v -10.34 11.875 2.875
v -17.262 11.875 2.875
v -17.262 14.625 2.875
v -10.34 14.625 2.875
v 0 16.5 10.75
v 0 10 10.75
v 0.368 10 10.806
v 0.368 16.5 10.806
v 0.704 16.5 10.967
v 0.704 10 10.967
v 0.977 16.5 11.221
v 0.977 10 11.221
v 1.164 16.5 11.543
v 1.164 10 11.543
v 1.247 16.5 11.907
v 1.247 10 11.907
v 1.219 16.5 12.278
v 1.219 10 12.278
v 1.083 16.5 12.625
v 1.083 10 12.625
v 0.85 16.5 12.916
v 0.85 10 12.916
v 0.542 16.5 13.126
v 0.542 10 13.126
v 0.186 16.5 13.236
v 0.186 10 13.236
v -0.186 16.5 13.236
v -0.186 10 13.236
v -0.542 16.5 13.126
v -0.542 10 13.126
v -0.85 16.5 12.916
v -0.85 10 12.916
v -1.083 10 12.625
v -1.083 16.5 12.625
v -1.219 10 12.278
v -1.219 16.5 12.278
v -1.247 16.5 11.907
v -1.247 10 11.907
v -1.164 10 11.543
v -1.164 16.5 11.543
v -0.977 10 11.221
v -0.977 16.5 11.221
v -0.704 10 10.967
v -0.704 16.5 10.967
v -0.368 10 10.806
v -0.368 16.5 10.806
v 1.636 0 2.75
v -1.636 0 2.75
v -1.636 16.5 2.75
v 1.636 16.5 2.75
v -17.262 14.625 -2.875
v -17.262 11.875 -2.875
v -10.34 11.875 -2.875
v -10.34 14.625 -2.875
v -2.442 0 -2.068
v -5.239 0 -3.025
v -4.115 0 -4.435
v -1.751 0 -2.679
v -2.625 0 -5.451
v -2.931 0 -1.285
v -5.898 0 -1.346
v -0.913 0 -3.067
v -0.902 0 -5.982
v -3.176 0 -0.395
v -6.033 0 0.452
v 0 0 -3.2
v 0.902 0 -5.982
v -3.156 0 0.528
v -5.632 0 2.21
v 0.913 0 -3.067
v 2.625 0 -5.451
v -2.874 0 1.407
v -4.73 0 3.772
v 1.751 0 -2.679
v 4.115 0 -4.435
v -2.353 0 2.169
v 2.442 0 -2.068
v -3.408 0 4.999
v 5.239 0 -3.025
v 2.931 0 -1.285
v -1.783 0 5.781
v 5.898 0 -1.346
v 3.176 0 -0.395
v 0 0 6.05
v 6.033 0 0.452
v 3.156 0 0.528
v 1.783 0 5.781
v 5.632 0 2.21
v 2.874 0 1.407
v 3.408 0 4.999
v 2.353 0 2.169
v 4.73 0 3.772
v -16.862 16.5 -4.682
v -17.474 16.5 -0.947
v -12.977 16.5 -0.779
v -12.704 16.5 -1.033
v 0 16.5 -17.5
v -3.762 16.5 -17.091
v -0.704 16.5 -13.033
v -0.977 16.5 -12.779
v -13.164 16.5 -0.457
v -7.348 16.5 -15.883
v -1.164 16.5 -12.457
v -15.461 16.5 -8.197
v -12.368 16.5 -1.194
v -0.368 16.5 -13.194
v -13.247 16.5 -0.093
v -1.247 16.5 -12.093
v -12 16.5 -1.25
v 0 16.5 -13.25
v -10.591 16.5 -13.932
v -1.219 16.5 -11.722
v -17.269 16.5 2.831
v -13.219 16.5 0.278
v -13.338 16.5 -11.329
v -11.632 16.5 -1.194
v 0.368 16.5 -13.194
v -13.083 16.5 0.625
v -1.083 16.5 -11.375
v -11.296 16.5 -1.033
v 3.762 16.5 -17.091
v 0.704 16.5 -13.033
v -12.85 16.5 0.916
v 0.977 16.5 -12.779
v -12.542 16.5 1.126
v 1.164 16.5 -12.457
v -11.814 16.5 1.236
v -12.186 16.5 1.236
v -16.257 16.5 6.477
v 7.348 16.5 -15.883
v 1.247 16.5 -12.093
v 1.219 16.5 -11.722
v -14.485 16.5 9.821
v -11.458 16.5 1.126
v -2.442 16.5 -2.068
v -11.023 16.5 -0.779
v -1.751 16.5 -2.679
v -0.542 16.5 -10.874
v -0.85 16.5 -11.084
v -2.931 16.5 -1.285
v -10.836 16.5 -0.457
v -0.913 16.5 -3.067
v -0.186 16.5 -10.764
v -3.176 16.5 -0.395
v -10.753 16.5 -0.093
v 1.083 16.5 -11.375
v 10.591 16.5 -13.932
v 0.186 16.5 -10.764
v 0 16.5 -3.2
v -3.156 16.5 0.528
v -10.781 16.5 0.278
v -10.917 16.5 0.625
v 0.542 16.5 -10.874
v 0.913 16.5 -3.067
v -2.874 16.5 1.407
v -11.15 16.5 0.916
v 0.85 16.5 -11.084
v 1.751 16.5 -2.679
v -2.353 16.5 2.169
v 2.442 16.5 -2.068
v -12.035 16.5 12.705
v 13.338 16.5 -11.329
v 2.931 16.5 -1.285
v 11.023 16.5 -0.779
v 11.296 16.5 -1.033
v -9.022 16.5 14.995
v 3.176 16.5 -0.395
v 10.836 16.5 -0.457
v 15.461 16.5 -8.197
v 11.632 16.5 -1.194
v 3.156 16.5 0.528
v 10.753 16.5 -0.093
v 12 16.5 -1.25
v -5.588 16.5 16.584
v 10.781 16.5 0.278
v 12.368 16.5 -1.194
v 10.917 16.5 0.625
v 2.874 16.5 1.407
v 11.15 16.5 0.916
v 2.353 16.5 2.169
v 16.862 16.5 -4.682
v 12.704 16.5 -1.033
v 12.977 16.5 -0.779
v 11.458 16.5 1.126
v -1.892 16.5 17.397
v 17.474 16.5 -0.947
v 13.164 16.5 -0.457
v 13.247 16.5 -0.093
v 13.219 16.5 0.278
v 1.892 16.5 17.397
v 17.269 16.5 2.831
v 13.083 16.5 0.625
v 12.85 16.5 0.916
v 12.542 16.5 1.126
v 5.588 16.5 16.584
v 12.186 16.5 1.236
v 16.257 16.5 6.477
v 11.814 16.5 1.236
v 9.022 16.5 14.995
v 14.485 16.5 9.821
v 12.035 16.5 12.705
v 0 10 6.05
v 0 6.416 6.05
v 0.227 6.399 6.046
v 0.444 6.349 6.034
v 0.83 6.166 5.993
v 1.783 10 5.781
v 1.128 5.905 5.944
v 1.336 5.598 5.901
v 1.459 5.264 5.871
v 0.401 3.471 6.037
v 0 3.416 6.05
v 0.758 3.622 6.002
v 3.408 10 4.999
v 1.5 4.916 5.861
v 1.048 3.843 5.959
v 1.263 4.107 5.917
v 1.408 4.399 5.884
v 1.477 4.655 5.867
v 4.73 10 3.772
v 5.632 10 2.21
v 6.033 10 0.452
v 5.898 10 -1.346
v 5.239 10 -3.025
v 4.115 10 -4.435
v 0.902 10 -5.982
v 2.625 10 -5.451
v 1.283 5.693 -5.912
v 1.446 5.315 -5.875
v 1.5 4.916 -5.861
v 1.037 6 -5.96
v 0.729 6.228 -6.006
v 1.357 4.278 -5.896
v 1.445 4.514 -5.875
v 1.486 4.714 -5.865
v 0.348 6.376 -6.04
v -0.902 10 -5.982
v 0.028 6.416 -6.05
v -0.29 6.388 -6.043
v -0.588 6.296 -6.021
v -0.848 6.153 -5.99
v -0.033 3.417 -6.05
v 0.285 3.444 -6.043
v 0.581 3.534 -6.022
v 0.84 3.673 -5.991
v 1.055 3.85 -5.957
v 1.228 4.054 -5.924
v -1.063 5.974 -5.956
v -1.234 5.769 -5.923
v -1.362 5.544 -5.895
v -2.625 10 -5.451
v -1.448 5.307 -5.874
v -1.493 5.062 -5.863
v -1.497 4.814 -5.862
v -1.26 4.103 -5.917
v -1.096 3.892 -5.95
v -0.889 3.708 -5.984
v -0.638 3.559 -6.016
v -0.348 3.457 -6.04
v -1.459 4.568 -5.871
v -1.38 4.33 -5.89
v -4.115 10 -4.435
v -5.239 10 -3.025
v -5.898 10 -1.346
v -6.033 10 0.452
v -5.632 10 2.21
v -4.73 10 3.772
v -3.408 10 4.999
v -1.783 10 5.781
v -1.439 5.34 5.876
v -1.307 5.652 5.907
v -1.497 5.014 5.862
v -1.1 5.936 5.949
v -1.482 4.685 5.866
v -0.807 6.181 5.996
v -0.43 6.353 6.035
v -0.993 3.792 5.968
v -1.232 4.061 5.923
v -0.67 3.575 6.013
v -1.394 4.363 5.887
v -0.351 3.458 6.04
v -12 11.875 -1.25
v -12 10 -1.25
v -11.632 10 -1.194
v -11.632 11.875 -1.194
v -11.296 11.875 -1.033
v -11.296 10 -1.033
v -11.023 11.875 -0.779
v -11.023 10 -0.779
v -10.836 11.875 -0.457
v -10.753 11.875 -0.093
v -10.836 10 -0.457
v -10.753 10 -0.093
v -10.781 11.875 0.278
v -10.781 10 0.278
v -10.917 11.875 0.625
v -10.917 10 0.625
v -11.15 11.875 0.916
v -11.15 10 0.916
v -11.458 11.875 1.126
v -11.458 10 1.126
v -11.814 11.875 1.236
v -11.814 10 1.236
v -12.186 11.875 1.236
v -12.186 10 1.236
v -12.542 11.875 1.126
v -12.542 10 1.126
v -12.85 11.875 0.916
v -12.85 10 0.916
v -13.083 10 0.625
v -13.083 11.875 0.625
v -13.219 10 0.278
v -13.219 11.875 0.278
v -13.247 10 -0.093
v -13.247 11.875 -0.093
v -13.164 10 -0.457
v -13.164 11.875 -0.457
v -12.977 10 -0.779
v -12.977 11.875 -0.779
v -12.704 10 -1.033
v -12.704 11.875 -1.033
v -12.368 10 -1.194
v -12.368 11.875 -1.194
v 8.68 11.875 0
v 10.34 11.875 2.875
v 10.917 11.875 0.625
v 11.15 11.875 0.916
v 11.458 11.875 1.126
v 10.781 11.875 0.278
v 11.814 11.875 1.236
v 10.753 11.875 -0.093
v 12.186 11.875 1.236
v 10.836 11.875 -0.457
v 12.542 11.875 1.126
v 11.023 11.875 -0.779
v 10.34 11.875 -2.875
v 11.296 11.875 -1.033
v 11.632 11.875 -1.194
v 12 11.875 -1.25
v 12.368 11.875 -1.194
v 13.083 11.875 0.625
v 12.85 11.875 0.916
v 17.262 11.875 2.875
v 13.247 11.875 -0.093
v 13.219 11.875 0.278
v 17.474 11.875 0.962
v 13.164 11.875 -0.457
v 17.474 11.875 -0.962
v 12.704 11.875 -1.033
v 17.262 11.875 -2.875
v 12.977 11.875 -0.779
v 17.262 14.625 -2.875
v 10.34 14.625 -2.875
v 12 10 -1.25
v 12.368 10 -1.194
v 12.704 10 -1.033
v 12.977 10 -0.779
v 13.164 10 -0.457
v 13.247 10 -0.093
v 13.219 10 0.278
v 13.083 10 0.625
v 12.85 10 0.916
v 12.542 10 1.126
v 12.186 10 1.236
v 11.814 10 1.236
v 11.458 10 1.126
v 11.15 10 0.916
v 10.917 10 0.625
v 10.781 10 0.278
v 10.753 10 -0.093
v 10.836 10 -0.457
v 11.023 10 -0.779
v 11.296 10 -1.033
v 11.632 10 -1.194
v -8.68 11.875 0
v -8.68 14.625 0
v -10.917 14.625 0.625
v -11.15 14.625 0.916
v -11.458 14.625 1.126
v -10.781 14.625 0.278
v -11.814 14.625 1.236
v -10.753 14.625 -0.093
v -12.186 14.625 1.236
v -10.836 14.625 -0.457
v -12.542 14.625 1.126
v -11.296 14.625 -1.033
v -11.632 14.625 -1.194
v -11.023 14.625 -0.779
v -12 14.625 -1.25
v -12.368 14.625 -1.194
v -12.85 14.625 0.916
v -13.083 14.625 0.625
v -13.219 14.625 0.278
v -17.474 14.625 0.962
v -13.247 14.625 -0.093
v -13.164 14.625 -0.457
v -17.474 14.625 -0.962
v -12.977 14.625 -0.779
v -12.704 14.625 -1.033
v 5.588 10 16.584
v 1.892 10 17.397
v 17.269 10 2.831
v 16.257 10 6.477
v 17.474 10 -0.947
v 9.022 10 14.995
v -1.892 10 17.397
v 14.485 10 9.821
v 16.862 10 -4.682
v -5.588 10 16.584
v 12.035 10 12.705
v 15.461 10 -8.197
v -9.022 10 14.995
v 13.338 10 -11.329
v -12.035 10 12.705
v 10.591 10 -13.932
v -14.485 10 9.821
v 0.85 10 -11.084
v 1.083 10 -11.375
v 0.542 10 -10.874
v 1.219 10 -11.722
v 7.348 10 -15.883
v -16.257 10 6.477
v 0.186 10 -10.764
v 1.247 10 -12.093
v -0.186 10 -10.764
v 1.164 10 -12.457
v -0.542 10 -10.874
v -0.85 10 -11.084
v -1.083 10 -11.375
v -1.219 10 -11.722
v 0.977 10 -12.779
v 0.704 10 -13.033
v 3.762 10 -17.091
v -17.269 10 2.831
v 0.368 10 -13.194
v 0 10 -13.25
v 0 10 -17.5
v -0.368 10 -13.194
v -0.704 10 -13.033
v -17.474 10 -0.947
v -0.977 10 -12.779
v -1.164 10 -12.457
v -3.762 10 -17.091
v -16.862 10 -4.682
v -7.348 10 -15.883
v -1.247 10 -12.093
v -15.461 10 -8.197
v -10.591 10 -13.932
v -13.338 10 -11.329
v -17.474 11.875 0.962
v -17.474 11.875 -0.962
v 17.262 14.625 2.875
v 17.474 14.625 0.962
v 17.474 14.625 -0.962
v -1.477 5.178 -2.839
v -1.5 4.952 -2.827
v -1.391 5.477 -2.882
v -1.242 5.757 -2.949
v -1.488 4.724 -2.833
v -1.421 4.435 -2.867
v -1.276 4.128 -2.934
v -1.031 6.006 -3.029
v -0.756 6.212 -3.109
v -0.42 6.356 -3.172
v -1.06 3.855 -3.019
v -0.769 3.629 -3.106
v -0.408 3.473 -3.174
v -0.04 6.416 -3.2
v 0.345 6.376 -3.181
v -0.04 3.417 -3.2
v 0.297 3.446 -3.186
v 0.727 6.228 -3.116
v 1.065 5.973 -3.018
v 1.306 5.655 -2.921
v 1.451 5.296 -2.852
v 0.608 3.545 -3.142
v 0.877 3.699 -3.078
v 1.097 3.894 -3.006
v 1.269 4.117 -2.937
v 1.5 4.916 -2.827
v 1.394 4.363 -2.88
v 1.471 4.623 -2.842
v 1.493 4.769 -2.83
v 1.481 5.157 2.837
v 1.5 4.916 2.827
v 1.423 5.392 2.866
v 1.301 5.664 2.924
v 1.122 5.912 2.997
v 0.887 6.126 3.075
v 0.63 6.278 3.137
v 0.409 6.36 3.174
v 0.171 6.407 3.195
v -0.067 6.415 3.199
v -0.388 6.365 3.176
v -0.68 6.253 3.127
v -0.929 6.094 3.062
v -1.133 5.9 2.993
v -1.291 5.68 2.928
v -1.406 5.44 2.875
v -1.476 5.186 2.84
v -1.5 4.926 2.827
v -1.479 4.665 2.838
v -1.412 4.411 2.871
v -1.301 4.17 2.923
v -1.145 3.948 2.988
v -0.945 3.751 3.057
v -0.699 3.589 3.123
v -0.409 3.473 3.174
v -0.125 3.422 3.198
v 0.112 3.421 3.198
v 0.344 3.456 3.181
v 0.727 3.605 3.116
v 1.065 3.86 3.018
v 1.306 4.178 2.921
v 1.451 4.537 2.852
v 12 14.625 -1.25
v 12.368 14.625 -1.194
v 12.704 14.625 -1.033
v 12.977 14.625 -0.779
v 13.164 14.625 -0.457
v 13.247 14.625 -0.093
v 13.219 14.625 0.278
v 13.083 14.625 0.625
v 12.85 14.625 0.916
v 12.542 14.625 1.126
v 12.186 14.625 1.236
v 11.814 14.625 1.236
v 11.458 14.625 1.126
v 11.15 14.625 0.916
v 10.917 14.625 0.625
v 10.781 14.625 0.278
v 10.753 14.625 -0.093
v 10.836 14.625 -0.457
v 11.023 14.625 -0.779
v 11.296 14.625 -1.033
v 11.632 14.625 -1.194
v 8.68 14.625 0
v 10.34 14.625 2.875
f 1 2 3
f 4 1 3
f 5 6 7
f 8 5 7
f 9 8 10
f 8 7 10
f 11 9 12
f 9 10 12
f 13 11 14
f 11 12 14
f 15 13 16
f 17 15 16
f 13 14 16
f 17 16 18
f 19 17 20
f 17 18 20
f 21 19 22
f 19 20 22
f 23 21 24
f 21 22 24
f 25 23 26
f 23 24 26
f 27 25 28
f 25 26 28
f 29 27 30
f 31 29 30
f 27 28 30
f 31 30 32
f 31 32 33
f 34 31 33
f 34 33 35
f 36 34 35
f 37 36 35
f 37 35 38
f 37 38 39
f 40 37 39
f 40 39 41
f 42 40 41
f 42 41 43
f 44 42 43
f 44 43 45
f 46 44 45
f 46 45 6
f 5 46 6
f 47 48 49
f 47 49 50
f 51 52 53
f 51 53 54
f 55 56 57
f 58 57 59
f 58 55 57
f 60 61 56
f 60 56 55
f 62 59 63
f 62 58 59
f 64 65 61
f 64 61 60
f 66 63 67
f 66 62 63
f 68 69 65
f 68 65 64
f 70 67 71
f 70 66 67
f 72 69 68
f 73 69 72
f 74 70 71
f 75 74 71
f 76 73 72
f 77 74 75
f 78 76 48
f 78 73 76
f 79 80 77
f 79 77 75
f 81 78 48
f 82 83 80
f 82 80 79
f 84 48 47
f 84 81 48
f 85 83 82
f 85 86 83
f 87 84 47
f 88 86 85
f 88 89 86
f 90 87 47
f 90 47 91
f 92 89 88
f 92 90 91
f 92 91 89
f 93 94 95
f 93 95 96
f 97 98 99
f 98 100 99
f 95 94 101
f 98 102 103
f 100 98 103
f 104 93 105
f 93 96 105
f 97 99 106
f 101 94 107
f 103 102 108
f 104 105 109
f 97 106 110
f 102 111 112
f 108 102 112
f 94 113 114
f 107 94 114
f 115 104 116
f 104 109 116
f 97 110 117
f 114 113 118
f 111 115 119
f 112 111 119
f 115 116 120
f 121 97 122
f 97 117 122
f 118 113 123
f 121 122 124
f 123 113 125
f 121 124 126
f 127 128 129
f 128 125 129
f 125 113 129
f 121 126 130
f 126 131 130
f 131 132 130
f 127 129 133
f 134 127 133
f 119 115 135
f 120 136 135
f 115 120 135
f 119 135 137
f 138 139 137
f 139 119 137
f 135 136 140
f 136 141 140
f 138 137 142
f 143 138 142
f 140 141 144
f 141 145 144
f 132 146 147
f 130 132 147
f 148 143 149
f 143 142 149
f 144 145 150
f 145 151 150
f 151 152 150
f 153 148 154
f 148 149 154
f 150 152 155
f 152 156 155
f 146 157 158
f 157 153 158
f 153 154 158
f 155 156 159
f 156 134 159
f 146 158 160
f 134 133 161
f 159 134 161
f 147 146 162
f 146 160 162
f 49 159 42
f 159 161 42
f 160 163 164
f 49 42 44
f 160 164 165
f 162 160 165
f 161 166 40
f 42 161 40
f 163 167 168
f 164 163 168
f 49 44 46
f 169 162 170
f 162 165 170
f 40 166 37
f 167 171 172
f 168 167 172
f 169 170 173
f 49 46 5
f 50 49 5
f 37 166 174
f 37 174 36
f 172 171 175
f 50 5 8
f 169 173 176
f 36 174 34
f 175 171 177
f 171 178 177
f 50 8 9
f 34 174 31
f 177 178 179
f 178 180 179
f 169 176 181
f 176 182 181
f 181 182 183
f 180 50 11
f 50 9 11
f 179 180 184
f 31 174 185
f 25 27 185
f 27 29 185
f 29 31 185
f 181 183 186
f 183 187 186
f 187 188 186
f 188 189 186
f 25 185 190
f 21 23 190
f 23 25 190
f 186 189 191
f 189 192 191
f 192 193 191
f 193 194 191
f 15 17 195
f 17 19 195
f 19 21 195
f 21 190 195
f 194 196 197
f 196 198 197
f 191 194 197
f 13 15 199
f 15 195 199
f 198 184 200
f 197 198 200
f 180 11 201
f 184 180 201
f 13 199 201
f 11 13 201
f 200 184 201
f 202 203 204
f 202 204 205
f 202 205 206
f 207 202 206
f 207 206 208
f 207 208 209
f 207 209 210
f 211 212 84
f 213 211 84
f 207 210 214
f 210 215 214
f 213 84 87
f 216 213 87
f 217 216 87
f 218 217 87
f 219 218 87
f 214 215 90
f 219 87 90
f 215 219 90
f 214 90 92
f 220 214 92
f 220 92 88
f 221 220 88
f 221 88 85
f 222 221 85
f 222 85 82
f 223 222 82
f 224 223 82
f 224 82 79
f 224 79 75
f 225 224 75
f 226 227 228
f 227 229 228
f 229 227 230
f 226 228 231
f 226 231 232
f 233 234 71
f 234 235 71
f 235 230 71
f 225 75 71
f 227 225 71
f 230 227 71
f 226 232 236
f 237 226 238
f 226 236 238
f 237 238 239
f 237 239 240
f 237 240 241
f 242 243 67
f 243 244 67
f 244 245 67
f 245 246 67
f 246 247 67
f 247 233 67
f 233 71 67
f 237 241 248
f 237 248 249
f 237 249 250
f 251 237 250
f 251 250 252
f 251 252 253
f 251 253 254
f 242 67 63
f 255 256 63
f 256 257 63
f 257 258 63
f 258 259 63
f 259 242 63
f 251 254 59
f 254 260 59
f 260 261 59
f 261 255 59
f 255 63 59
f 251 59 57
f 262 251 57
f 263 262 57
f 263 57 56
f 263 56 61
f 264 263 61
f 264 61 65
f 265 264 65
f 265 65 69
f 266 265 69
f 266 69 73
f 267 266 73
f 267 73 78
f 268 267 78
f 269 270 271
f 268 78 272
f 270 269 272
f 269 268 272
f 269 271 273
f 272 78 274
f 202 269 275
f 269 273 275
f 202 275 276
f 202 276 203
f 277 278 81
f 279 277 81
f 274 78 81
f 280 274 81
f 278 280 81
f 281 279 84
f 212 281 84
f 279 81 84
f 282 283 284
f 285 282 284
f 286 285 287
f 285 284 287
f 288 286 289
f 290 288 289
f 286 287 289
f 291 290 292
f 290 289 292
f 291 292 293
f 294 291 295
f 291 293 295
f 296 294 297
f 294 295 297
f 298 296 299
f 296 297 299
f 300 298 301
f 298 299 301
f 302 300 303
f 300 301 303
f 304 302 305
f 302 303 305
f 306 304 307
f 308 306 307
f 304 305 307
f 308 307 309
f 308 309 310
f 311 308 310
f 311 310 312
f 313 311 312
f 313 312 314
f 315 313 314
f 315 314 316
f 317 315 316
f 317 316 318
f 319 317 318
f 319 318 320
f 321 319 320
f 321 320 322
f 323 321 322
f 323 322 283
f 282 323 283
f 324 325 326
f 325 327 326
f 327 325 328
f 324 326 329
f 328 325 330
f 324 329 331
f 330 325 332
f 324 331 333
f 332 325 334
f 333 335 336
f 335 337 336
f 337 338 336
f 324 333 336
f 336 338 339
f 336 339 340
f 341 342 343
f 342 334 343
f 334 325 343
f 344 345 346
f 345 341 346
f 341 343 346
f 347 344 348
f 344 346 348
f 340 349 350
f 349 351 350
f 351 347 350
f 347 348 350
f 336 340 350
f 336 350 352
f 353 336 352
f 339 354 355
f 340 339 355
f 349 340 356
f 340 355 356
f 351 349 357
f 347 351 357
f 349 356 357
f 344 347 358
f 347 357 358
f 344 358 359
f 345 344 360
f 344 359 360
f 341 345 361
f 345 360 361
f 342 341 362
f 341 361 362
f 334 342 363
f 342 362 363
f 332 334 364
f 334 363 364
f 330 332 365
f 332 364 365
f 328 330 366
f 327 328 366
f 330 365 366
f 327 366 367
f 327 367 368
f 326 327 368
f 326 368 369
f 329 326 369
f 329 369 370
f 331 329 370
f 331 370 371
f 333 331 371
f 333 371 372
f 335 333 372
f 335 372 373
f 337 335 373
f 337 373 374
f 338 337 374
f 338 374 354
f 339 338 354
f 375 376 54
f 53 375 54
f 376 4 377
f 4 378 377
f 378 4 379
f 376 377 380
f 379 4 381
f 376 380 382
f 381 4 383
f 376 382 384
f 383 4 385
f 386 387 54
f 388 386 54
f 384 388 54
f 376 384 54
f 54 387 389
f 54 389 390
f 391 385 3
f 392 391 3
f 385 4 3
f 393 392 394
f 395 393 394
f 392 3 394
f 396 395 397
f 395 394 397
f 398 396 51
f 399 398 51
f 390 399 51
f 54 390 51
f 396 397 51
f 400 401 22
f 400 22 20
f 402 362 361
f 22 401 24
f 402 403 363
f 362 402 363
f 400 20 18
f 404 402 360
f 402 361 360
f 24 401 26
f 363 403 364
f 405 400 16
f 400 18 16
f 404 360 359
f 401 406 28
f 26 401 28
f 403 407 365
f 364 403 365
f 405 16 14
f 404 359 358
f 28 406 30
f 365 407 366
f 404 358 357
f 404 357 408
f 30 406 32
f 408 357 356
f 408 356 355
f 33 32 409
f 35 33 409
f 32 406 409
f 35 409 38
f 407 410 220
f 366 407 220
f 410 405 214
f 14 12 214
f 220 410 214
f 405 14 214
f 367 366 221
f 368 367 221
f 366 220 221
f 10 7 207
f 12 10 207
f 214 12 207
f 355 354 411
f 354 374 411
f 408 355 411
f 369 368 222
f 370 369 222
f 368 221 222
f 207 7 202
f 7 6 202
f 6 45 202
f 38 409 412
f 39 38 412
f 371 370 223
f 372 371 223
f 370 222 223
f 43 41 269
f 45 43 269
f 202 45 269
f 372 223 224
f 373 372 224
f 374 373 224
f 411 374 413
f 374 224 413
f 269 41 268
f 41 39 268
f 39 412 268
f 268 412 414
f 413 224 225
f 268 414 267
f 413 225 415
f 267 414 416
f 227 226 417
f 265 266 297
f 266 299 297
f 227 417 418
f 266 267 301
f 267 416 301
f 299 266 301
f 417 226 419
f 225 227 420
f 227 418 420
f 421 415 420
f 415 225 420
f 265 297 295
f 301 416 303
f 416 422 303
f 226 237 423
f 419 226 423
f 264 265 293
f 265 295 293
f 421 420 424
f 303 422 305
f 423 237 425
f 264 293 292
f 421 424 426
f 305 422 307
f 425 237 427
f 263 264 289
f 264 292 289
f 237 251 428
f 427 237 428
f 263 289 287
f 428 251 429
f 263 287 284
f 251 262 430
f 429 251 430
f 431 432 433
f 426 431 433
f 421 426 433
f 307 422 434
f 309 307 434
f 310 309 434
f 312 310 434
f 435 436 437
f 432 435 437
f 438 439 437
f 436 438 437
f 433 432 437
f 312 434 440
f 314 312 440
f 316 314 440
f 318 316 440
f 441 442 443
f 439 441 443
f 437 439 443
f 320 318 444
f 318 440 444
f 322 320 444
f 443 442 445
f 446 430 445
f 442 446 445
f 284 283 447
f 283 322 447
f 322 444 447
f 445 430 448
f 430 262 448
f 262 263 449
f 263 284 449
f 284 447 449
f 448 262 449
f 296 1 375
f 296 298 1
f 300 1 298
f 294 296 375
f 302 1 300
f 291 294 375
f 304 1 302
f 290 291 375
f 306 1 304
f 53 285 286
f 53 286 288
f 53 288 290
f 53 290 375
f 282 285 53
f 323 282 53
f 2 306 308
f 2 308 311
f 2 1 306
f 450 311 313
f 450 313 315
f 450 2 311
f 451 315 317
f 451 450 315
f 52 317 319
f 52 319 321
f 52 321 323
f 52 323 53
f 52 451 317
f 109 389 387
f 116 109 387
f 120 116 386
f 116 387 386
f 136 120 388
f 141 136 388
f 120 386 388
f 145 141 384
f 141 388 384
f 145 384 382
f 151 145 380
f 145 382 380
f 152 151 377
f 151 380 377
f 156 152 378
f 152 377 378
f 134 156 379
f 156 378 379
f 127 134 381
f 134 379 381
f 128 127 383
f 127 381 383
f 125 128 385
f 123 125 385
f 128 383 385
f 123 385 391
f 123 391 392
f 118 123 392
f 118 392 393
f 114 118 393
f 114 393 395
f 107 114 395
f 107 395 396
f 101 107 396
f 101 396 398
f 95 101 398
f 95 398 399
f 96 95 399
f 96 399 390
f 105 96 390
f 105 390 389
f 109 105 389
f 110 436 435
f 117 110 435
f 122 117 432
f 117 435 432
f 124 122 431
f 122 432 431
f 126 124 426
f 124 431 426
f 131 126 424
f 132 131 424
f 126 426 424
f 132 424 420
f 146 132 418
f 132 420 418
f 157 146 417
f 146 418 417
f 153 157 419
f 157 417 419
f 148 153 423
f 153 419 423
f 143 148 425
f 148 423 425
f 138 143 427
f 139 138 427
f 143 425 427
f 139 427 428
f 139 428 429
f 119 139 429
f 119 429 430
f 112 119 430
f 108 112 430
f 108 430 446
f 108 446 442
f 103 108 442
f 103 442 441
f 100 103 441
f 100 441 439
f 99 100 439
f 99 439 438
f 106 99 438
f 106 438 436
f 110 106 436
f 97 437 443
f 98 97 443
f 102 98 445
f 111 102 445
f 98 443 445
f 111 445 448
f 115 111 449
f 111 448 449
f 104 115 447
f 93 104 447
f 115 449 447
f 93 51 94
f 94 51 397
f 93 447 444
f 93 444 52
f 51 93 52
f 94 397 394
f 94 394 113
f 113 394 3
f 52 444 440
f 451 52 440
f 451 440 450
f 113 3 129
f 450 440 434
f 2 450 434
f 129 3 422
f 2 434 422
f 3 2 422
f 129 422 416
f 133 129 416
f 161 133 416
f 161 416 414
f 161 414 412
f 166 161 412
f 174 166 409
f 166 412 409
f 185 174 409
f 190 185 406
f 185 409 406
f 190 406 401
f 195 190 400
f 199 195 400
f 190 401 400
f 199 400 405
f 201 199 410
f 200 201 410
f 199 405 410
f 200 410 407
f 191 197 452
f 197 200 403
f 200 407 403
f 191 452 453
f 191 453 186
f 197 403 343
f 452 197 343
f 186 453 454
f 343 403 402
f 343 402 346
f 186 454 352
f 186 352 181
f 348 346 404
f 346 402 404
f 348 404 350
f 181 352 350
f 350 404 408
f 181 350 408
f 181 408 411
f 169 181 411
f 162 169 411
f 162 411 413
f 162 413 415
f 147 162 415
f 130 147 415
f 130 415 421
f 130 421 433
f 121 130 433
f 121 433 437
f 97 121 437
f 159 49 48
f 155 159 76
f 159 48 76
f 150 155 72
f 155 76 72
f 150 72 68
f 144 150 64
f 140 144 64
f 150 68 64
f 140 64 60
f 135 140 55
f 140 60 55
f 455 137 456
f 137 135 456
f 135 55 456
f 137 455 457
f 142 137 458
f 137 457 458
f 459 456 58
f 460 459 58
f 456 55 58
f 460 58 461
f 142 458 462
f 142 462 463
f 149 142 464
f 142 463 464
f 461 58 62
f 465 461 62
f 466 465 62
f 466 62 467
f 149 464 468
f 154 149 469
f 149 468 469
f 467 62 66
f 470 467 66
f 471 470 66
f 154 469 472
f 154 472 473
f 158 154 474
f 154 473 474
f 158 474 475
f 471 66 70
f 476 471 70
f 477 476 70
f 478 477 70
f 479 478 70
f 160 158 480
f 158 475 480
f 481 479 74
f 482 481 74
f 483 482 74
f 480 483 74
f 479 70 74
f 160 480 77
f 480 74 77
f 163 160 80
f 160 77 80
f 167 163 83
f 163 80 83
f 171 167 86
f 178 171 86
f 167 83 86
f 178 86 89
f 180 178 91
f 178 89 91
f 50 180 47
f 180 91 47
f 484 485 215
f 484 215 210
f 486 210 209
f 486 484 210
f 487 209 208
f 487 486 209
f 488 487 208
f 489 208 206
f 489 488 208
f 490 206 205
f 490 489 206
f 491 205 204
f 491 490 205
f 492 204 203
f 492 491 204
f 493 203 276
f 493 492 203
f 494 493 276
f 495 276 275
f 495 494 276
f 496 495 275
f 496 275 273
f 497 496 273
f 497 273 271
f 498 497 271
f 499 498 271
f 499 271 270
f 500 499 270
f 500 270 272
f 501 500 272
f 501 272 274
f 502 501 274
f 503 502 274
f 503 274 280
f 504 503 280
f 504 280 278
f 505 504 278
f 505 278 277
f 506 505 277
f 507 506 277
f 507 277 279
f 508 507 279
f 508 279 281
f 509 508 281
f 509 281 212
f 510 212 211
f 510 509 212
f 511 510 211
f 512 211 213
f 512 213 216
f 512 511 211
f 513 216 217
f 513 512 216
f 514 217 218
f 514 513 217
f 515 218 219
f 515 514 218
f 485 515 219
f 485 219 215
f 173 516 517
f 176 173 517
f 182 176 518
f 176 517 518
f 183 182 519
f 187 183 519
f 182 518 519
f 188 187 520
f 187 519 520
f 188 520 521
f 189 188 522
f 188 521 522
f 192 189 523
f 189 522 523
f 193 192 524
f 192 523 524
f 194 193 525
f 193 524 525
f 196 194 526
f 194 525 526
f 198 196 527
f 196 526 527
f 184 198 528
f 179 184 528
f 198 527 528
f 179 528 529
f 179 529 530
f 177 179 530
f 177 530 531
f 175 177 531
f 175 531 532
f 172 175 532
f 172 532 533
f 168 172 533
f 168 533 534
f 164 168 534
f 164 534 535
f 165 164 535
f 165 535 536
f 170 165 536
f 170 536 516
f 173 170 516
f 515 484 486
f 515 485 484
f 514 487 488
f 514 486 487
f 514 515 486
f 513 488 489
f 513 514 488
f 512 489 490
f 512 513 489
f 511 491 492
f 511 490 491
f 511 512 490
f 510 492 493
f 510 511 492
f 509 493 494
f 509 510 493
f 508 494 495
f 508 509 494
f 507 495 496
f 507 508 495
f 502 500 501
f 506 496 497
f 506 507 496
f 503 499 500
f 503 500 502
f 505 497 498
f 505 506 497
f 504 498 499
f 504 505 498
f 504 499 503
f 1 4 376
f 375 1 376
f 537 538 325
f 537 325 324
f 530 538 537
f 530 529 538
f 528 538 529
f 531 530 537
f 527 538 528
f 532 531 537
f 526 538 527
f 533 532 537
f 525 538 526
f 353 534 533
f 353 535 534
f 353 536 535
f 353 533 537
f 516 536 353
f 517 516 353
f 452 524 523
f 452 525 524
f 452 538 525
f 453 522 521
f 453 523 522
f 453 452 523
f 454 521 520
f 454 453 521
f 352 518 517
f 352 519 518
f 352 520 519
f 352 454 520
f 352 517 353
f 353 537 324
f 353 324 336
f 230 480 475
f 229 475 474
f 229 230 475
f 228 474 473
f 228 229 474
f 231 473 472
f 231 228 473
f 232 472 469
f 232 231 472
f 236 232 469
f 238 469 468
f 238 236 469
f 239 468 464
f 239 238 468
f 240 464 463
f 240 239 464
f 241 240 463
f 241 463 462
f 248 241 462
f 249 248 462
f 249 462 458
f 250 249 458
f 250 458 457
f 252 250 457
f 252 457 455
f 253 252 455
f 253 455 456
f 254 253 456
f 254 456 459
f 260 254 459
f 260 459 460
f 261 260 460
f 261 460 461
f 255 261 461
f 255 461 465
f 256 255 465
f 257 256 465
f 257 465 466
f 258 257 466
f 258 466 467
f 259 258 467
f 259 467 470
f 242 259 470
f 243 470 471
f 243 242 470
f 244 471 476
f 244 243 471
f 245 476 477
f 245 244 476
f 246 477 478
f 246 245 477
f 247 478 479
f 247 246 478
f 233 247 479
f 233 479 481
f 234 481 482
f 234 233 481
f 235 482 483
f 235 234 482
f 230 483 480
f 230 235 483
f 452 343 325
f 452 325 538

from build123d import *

# Parameters (mm, degrees)
SKETCH1_R                      = 6.05
SKETCH1_R_2                    = 3.05
BOSS_EXTRUDE1_DEPTH            = 10
SKETCH2_R                      = 17.5
BOSS_EXTRUDE2_DEPTH            = 6.5
CUT_EXTRUDE1_REACH             = 28.693
SKETCH3_R                      = 1.25
CUT_EXTRUDE2_DEPTH             = 30.744747435
CUT_EXTRUDE2_DEPTH_BACK        = 30.744747435
SKETCH4_R                      = 1.5
CUT_EXTRUDE3_REACH             = 28.693
SKETCH6_R                      = 3.2
CUT_EXTRUDE3_DIRECTION_2_REACH = 28.693
BOSS_EXTRUDE3_DEPTH            = 16.5
SKETCH8_W                      = 5.75
SKETCH8_H                      = 2.75
CUT_EXTRUDE4_DEPTH             = 5
CUT_EXTRUDE5_DEPTH             = 2.75


with BuildPart() as part:
    # Sketch1 → Boss-Extrude1 (new body)
    with BuildSketch(Plane(origin=(0, 0, 0), x_dir=(1, 0, 0), z_dir=(0, 1, 0))):
        with Locations(Location((0, 0, 0), (0, 0, 270))):
            Circle(SKETCH1_R)
        with Locations(Location((0, 0, 0), (0, 0, 270))):
            Circle(SKETCH1_R_2, mode=Mode.SUBTRACT)
    extrude(amount=BOSS_EXTRUDE1_DEPTH)

    # Sketch2 → Boss-Extrude2 (add)
    with BuildSketch(Plane(origin=(0, 10, 0), x_dir=(1, 0, 0), z_dir=(0, 1, 0))):
        with Locations(Location((0, 0, 0), (0, 0, 90))):
            Circle(SKETCH2_R)
    extrude(amount=BOSS_EXTRUDE2_DEPTH)

    # Sketch3 → Cut-Extrude1 (cut, up to next)
    with BuildSketch(Plane.XZ.offset(-10), mode=Mode.PRIVATE) as cut_extrude1_sk1:
        with Locations(Location((12, 0, 0), (0, 0, 270))):
            Circle(SKETCH3_R)
    cut_extrude1_tool1 = extrude(cut_extrude1_sk1.sketch, amount=-CUT_EXTRUDE1_REACH, mode=Mode.PRIVATE) & part.part
    # Sketch3 → Cut-Extrude1 (cut, up to next)
    with BuildSketch(Plane.XZ.offset(-10), mode=Mode.PRIVATE) as cut_extrude1_sk2:
        with Locations(Location((0, -12, 0), (0, 0, 270))):
            Circle(SKETCH3_R)
    cut_extrude1_tool2 = extrude(cut_extrude1_sk2.sketch, amount=-CUT_EXTRUDE1_REACH, mode=Mode.PRIVATE) & part.part
    # Sketch3 → Cut-Extrude1 (cut, up to next)
    with BuildSketch(Plane.XZ.offset(-10), mode=Mode.PRIVATE) as cut_extrude1_sk3:
        with Locations(Location((-12, 0, 0), (0, 0, 270))):
            Circle(SKETCH3_R)
    cut_extrude1_tool3 = extrude(cut_extrude1_sk3.sketch, amount=-CUT_EXTRUDE1_REACH, mode=Mode.PRIVATE) & part.part
    # Sketch3 → Cut-Extrude1 (cut, up to next)
    with BuildSketch(Plane.XZ.offset(-10), mode=Mode.PRIVATE) as cut_extrude1_sk4:
        with Locations(Location((0, 12, 0), (0, 0, 270))):
            Circle(SKETCH3_R)
    cut_extrude1_tool4 = extrude(cut_extrude1_sk4.sketch, amount=-CUT_EXTRUDE1_REACH, mode=Mode.PRIVATE) & part.part
    add(cut_extrude1_tool1.solids().sort_by_distance((12, 10, 0))[0], mode=Mode.SUBTRACT)
    add(cut_extrude1_tool2.solids().sort_by_distance((0, 10, -12))[0], mode=Mode.SUBTRACT)
    add(cut_extrude1_tool3.solids().sort_by_distance((-12, 10, 0))[0], mode=Mode.SUBTRACT)
    add(cut_extrude1_tool4.solids().sort_by_distance((0, 10, 12))[0], mode=Mode.SUBTRACT)

    # Sketch4 → Cut-Extrude2 (cut, two sides: drawn at the far end of the back side and taken through both)
    with BuildSketch(Plane.XY.offset(-CUT_EXTRUDE2_DEPTH_BACK)):
        with Locations((0, 4.916404418)):
            Circle(SKETCH4_R)
    extrude(amount=CUT_EXTRUDE2_DEPTH + CUT_EXTRUDE2_DEPTH_BACK, mode=Mode.SUBTRACT)

    # Sketch6 → Cut-Extrude3 (cut, up to next)
    with BuildSketch(Plane(origin=(0, 10, 0), x_dir=(-1, 0, 0), z_dir=(0, -1, 0)), mode=Mode.PRIVATE) as cut_extrude3_sk1:
        with Locations(Location((0, 0, 0), (0, 0, 270))):
            Circle(SKETCH6_R)
    cut_extrude3_tool1 = extrude(cut_extrude3_sk1.sketch, amount=-CUT_EXTRUDE3_REACH, mode=Mode.PRIVATE) & part.part
    add(cut_extrude3_tool1.solids().sort_by_distance((0, 10, 0))[0], mode=Mode.SUBTRACT)

    # Sketch6 → Cut-Extrude3 direction 2 (cut, up to next)
    with BuildSketch(Plane(origin=(0, 10, 0), x_dir=(-1, 0, 0), z_dir=(0, -1, 0)), mode=Mode.PRIVATE) as cut_extrude3_direction_2_sk1:
        with Locations(Location((0, 0, 0), (0, 0, 270))):
            Circle(SKETCH6_R)
    cut_extrude3_direction_2_tool1 = extrude(cut_extrude3_direction_2_sk1.sketch, amount=CUT_EXTRUDE3_DIRECTION_2_REACH, mode=Mode.PRIVATE) & part.part
    add(cut_extrude3_direction_2_tool1.solids().sort_by_distance((0, 10, 0))[0], mode=Mode.SUBTRACT)

    # Sketch7 → Boss-Extrude3 (add)
    with BuildSketch(Plane.XZ):
        with BuildLine():
            Line((-1.636306817, 2.75), (1.636306817, 2.75))
            ThreePointArc((1.636306817, 2.75), (0, 3.2), (-1.636306817, 2.75))
        make_face()
    extrude(amount=-BOSS_EXTRUDE3_DEPTH)

    # Sketch8 → Cut-Extrude4 (cut)
    with BuildSketch(Plane(origin=(17.5, 0, 0), x_dir=(0, 0, -1), z_dir=(1, 0, 0))):
        with Locations((0, 13.25)):
            Rectangle(SKETCH8_W, SKETCH8_H)
    cut_extrude4 = extrude(amount=-CUT_EXTRUDE4_DEPTH, mode=Mode.SUBTRACT)

    # Sketch9 → Cut-Extrude5 (cut)
    with BuildSketch(Plane.XZ.offset(-14.625)):
        Polygon((15.319764048, 0), (13.659882024, 2.875), (10.340117976, 2.875), (8.680235952, 0), (10.340117976, -2.875), (13.659882024, -2.875), align=None)
    cut_extrude5 = extrude(amount=CUT_EXTRUDE5_DEPTH, mode=Mode.SUBTRACT)

    # Mirror1: Cut-Extrude4, Cut-Extrude5 across plane
    add(cut_extrude4.mirror(Plane(origin=(0, 0, 0), x_dir=(0, 0, 1), z_dir=(1, 0, 0))), mode=Mode.SUBTRACT)
    add(cut_extrude5.mirror(Plane(origin=(0, 0, 0), x_dir=(0, 0, 1), z_dir=(1, 0, 0))), mode=Mode.SUBTRACT)


solid = part.part
